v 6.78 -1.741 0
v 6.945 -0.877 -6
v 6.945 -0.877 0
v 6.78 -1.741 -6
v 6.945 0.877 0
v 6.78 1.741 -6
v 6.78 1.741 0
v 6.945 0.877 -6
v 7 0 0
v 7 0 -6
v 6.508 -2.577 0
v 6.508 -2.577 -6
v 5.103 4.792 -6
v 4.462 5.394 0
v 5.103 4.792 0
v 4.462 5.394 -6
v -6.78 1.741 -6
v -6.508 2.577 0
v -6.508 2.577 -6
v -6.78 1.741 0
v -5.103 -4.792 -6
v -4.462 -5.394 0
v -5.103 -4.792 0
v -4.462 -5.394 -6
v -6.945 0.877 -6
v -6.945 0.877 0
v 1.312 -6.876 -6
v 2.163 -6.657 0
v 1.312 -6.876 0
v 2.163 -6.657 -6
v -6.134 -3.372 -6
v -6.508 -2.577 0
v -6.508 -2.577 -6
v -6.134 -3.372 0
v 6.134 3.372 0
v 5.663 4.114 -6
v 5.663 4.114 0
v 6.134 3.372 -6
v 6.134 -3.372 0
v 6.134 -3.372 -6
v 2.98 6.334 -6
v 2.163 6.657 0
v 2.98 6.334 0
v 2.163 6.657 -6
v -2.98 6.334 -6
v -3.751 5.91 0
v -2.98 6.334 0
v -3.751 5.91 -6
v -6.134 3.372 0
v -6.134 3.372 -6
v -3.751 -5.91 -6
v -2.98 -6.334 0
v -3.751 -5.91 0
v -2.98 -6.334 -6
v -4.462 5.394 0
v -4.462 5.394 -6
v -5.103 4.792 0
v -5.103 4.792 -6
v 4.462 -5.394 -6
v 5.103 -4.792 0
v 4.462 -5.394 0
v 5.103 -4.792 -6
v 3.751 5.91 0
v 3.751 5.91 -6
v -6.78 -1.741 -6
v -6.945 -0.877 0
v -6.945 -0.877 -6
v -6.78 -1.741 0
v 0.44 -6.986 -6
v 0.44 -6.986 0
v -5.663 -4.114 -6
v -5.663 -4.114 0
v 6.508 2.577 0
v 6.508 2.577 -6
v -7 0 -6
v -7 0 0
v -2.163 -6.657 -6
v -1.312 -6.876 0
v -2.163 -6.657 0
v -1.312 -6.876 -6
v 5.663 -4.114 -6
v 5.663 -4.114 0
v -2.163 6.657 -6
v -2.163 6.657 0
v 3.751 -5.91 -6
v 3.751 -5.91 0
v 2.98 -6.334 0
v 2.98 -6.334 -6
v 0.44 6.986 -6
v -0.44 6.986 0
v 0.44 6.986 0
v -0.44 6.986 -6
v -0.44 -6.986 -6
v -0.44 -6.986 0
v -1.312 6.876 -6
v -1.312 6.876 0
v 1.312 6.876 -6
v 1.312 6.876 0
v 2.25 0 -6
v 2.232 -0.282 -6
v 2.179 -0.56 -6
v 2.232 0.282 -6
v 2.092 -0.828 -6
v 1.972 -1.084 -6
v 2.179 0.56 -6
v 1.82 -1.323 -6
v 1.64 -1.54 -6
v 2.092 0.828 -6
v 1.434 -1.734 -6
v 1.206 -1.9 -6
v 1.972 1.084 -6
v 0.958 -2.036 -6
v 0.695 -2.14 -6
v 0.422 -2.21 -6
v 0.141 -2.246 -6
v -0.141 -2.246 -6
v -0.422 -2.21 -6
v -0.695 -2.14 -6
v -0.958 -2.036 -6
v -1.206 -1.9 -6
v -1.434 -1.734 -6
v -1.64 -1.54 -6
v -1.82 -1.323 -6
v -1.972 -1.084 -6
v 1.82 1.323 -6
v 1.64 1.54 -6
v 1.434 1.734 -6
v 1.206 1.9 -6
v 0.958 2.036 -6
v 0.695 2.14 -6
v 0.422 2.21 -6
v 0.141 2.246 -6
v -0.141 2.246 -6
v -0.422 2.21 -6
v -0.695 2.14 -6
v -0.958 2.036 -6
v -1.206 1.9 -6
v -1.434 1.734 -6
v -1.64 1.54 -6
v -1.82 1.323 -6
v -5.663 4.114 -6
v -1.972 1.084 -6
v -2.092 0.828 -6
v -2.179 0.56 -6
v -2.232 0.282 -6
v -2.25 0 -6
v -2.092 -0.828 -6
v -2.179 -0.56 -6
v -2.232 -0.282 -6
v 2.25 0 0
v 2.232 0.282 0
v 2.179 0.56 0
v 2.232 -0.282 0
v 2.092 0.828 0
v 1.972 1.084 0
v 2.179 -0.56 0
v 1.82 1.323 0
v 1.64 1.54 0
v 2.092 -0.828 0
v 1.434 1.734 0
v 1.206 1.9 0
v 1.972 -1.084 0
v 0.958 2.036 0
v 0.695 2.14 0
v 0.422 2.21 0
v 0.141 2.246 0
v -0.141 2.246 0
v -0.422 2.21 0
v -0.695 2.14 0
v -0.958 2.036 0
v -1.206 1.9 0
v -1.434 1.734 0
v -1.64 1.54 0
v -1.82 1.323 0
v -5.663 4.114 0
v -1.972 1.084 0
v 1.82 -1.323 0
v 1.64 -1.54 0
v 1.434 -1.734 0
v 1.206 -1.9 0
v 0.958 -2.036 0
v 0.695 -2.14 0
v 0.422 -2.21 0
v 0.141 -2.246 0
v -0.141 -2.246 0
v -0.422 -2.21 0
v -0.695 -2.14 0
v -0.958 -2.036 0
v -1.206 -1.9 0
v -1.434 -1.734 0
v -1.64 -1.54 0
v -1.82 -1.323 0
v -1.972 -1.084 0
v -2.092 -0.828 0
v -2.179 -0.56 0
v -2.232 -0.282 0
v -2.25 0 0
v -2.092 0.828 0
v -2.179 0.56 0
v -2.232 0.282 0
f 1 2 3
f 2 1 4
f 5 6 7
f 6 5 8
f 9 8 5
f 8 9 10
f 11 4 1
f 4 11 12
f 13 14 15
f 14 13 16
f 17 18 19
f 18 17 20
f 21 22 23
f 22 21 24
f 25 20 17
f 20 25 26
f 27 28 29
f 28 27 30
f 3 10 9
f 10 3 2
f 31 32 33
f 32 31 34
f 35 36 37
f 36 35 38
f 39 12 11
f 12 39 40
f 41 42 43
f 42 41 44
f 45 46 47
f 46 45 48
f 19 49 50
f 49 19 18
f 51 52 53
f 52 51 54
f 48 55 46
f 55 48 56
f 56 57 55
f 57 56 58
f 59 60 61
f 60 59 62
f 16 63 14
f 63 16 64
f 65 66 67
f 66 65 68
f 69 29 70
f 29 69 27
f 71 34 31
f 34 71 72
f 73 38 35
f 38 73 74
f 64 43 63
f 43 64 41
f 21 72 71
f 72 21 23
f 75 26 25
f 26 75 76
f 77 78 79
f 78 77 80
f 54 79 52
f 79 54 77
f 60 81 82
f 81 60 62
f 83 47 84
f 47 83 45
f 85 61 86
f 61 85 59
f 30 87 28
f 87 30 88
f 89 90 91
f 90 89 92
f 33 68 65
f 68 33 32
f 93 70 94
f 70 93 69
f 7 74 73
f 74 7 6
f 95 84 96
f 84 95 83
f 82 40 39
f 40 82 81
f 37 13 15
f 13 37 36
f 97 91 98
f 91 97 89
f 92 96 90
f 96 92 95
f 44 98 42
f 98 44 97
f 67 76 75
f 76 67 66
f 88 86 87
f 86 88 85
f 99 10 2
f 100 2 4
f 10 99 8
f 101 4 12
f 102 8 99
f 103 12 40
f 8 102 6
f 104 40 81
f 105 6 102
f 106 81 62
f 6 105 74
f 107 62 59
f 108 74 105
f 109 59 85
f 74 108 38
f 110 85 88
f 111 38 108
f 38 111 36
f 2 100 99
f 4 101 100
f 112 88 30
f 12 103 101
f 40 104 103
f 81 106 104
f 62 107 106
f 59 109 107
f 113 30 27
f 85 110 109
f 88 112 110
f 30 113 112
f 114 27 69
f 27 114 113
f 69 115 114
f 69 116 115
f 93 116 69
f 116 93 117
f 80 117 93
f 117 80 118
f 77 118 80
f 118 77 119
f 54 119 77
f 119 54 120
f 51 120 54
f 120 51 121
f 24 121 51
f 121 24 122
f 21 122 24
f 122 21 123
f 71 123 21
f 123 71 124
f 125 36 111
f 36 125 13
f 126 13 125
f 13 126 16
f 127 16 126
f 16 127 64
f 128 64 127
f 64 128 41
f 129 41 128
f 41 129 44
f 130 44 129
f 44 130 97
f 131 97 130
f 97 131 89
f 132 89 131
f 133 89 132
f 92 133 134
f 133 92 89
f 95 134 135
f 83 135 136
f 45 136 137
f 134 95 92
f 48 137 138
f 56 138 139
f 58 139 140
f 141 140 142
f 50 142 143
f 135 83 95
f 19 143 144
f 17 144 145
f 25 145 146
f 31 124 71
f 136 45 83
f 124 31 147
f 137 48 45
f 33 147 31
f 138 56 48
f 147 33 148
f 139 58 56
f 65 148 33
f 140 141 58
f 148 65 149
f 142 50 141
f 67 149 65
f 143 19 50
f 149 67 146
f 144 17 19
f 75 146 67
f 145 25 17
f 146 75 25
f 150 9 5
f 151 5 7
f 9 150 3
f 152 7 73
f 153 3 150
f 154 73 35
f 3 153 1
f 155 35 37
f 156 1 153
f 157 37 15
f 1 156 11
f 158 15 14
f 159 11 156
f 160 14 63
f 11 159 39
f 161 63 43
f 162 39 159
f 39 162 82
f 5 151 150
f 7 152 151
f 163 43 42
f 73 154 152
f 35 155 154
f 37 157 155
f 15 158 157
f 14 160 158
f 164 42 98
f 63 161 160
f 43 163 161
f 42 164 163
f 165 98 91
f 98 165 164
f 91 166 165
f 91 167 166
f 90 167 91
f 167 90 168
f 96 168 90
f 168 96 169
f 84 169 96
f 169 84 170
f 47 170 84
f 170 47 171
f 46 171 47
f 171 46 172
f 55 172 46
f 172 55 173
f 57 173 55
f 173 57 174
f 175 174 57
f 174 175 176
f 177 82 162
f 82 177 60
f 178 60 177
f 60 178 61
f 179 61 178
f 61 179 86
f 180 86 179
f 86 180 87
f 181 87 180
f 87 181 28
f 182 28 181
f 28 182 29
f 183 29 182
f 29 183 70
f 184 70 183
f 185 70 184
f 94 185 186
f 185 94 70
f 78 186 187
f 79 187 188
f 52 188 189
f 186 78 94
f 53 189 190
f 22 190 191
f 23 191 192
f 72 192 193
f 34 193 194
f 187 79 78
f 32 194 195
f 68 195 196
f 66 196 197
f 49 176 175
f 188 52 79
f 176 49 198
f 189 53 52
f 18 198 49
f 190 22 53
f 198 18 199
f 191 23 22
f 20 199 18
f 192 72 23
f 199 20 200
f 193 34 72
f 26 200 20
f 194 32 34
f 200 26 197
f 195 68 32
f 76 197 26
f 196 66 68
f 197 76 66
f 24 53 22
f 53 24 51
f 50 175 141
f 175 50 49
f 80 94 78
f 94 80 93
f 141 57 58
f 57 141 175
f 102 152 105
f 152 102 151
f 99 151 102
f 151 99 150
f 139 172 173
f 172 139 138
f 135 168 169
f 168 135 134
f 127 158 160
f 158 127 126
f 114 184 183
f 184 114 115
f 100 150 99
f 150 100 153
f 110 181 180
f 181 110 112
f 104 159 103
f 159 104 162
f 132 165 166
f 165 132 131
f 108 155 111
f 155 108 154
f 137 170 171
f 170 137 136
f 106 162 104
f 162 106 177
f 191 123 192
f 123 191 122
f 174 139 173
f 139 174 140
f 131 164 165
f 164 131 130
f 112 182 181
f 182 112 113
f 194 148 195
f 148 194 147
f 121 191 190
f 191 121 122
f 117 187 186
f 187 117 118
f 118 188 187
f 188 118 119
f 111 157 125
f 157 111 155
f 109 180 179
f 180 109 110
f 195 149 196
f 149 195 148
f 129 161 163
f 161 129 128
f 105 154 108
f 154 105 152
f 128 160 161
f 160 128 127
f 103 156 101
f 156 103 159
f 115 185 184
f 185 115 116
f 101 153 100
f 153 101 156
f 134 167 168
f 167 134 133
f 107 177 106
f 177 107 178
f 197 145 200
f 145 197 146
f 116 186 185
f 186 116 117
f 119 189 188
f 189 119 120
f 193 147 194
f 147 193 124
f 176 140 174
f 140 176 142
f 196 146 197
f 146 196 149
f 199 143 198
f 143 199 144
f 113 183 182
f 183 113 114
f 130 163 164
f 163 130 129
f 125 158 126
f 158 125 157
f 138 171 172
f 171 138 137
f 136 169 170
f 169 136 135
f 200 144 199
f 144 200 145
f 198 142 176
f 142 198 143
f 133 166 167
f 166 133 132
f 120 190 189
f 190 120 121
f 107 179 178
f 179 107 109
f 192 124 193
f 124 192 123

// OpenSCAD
$fn = 50;


difference() {
	union() {
		translate(v = [0, 0, -6.0000000000]) {
			cylinder(h = 6, r = 7.0000000000);
		}
		cylinder(h = 0, r = 16.0000000000);
	}
	union() {
		#translate(v = [0, 0, -6]) {
			cylinder(h = 6, r = 2.2500000000);
		}
	}
}
